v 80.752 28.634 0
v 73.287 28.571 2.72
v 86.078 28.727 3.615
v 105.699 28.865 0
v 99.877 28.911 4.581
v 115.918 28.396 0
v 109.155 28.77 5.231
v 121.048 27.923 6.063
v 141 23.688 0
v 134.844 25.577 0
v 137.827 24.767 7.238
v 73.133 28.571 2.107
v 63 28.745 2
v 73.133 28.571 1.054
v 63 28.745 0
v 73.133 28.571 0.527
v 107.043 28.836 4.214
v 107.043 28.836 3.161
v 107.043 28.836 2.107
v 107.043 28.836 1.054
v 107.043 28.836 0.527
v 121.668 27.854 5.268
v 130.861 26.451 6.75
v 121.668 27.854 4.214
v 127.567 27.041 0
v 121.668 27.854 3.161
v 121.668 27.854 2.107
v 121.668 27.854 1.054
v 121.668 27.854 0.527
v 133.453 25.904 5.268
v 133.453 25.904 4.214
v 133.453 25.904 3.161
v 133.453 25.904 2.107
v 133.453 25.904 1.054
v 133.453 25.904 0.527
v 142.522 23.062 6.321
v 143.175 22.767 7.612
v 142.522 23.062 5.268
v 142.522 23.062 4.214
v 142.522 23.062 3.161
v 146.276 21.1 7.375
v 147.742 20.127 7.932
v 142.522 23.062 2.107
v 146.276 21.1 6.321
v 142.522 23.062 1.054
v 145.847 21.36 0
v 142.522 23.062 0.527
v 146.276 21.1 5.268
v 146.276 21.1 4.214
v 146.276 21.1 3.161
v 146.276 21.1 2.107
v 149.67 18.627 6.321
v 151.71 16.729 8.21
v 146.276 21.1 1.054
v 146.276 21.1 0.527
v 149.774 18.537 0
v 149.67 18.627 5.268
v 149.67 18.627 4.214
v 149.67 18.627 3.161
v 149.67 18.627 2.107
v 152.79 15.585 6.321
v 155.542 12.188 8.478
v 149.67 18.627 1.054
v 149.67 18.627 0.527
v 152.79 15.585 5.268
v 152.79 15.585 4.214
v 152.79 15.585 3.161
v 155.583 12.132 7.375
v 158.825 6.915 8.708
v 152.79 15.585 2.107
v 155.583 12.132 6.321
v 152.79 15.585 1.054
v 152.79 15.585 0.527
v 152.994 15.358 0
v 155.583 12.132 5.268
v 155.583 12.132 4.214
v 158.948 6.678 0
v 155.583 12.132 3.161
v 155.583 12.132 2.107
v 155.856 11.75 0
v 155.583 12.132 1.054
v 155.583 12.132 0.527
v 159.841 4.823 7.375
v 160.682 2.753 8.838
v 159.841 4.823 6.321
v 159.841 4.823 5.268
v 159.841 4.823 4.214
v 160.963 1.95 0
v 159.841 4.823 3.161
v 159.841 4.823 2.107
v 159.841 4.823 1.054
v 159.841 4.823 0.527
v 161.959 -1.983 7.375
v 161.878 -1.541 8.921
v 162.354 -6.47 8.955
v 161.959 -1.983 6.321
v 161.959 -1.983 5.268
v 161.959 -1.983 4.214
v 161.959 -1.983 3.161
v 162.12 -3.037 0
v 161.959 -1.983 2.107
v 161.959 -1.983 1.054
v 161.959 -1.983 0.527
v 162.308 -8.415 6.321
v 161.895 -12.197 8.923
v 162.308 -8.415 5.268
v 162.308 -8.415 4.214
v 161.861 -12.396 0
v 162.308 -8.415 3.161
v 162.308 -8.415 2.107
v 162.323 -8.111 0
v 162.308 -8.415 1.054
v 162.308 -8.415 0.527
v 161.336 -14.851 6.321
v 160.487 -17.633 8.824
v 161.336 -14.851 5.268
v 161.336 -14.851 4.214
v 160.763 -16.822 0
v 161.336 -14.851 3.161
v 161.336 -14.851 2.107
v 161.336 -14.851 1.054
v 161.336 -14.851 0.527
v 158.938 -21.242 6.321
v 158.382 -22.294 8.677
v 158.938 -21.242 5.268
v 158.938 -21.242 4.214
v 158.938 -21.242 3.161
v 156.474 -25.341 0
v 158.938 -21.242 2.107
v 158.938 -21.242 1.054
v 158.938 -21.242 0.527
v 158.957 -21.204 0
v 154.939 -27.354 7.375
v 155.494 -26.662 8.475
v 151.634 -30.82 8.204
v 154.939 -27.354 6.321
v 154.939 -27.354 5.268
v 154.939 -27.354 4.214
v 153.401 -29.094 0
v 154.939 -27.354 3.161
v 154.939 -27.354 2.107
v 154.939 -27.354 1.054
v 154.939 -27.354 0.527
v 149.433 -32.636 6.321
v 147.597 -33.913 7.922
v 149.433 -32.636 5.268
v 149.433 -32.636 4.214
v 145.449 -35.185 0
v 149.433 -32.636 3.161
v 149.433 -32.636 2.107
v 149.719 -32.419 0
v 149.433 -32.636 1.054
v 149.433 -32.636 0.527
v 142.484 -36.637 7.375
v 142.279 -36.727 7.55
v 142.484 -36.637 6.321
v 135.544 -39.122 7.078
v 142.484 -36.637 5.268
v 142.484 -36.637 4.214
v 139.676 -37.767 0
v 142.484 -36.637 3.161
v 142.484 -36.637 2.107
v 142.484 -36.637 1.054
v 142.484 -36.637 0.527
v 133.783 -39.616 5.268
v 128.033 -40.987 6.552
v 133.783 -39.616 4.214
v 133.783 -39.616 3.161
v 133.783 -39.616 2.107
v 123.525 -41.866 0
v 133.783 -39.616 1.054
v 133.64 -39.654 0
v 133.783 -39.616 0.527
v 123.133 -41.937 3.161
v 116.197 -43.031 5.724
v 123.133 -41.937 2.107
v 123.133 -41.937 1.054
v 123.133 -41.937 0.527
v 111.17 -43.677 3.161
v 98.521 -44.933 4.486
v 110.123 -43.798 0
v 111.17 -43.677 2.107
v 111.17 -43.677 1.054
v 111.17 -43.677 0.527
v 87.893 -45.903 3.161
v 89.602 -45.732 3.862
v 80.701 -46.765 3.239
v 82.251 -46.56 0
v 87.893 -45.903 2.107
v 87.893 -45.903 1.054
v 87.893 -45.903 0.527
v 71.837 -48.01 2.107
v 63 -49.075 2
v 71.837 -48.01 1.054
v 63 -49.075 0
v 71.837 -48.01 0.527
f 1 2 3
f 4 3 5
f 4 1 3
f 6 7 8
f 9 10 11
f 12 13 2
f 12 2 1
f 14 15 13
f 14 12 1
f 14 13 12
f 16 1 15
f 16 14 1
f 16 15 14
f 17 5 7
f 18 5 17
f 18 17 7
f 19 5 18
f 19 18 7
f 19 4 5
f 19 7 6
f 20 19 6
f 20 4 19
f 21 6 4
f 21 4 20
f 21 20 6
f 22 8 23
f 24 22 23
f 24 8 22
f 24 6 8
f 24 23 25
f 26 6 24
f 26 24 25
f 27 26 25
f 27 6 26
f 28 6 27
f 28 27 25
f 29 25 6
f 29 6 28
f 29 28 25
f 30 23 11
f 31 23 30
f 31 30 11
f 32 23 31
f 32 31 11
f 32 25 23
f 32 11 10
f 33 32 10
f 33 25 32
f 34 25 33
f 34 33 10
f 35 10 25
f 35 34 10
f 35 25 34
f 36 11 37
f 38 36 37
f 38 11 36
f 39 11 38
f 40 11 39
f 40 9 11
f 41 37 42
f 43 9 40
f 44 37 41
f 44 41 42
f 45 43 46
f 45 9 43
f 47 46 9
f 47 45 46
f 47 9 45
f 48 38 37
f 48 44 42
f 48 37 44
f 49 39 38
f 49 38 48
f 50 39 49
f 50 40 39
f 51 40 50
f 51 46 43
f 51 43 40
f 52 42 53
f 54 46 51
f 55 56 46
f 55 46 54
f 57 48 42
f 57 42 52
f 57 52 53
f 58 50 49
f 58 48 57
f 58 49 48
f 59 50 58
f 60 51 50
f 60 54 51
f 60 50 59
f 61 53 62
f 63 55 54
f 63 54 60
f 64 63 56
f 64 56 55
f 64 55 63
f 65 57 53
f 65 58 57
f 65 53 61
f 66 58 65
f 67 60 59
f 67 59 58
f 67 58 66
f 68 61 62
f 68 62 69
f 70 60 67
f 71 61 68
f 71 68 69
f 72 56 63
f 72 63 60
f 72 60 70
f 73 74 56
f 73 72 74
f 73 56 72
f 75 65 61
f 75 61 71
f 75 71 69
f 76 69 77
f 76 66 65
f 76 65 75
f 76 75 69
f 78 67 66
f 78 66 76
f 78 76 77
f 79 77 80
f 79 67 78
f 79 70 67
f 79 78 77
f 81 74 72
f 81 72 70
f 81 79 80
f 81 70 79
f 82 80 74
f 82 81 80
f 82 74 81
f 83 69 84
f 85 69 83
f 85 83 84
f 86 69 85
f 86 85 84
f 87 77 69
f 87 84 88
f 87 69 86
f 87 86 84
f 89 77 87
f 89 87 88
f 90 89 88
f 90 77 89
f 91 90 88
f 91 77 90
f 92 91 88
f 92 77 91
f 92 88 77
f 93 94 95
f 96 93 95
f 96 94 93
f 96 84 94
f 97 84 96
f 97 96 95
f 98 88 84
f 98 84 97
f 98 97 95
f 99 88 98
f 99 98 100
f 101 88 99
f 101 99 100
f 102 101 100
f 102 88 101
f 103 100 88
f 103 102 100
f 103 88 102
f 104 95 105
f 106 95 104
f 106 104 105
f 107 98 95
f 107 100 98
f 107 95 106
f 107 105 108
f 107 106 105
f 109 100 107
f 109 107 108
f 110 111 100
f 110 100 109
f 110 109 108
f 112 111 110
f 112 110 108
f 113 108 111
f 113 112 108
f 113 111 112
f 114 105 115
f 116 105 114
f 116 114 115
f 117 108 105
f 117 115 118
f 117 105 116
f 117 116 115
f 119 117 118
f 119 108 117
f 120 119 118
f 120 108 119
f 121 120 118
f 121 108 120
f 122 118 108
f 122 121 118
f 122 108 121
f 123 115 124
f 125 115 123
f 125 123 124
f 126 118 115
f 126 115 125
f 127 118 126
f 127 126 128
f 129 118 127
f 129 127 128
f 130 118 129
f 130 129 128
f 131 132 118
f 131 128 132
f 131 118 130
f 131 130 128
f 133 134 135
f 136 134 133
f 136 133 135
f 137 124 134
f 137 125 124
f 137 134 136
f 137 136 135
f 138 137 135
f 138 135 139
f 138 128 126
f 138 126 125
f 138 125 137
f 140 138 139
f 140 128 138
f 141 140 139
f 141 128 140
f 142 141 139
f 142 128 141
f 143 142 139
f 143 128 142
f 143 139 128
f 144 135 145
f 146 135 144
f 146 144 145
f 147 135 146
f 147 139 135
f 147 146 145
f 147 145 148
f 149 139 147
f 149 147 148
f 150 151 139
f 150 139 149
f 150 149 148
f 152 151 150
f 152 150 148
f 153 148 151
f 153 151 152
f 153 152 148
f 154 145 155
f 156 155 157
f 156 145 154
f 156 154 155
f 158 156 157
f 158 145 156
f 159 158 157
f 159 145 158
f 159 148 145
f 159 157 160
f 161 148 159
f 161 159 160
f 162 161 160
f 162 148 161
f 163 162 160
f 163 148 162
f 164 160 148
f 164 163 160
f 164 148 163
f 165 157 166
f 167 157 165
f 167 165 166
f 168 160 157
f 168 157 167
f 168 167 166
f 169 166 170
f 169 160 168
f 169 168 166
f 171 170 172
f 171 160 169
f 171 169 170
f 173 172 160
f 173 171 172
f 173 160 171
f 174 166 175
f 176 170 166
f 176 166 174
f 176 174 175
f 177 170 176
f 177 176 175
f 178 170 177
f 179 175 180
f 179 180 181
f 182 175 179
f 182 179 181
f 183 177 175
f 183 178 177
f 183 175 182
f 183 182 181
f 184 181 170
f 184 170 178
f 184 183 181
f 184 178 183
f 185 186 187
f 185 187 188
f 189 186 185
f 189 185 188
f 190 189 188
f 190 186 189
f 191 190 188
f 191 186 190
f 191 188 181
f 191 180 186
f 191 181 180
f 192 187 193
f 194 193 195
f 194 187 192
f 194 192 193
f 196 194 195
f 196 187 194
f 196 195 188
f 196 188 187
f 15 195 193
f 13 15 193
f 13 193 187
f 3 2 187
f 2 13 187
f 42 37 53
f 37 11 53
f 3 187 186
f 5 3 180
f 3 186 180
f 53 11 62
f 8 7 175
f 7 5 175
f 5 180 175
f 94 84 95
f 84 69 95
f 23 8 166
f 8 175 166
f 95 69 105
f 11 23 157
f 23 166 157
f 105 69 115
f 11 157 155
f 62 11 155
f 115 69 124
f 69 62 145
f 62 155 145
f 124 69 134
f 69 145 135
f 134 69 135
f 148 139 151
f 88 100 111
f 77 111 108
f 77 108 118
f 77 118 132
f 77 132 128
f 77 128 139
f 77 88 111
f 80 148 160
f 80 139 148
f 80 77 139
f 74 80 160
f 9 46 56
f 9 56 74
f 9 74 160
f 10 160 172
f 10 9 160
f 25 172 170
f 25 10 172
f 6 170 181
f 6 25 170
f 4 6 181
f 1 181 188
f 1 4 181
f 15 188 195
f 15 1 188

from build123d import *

# Parameters (mm, degrees)
EXTRUDE001_DEPTH = 50
EXTRUDE_DEPTH    = 20


with BuildPart() as extrude001:
    # Sketch001 → Extrude001 (new body, symmetric)
    with BuildSketch(Plane.XZ):
        Polygon((163, 9), (163, 0), (63, 0), (63, 2), align=None)
    extrude(amount=EXTRUDE001_DEPTH, both=True)


with BuildPart() as sole_common:
    # Sketch → Extrude (new body)
    with BuildSketch(Plane.XY):
        with BuildLine():
            add(Edge.make_bspline(
                [(28.527908, 30.070617), (53.668641, 29.161806), (71.252917, 28.006371), (108.907617, 29.659132), (135.37605, 26.370678), (150.307866, 20.28509), (161.410475, 4.248986), (163.096412, -8.34086), (160.0501, -21.375878), (150.331285, -33.60816), (135.221568, -40.006538), (111.481583, -44.060017), (85.872957, -45.814744), (72.385785, -48.096242), (55.603022, -49.861314), (40.08293, -51.615038), (23.883279, -51.7761), (0, -57.105208), (0, 36.015467), (28.527908, 30.070617)],
                knots=[0, 0, 0, 0, 0.058824, 0.117647, 0.176471, 0.235294, 0.294118, 0.352941, 0.411765, 0.470588, 0.529412, 0.588235, 0.647059, 0.705882, 0.764706, 0.823529, 0.882353, 0.941176, 1, 1, 1, 1], degree=3, weights=[1, 1, 1, 1, 1, 1, 1, 1, 1, 1, 1, 1, 1, 1, 1, 0.379422, 1, 1, 1, 1]))
        make_face()
    extrude(amount=EXTRUDE_DEPTH)

    # Common: intersect Extrude001
    add(extrude001.part, mode=Mode.INTERSECT)


solid = sole_common.part
